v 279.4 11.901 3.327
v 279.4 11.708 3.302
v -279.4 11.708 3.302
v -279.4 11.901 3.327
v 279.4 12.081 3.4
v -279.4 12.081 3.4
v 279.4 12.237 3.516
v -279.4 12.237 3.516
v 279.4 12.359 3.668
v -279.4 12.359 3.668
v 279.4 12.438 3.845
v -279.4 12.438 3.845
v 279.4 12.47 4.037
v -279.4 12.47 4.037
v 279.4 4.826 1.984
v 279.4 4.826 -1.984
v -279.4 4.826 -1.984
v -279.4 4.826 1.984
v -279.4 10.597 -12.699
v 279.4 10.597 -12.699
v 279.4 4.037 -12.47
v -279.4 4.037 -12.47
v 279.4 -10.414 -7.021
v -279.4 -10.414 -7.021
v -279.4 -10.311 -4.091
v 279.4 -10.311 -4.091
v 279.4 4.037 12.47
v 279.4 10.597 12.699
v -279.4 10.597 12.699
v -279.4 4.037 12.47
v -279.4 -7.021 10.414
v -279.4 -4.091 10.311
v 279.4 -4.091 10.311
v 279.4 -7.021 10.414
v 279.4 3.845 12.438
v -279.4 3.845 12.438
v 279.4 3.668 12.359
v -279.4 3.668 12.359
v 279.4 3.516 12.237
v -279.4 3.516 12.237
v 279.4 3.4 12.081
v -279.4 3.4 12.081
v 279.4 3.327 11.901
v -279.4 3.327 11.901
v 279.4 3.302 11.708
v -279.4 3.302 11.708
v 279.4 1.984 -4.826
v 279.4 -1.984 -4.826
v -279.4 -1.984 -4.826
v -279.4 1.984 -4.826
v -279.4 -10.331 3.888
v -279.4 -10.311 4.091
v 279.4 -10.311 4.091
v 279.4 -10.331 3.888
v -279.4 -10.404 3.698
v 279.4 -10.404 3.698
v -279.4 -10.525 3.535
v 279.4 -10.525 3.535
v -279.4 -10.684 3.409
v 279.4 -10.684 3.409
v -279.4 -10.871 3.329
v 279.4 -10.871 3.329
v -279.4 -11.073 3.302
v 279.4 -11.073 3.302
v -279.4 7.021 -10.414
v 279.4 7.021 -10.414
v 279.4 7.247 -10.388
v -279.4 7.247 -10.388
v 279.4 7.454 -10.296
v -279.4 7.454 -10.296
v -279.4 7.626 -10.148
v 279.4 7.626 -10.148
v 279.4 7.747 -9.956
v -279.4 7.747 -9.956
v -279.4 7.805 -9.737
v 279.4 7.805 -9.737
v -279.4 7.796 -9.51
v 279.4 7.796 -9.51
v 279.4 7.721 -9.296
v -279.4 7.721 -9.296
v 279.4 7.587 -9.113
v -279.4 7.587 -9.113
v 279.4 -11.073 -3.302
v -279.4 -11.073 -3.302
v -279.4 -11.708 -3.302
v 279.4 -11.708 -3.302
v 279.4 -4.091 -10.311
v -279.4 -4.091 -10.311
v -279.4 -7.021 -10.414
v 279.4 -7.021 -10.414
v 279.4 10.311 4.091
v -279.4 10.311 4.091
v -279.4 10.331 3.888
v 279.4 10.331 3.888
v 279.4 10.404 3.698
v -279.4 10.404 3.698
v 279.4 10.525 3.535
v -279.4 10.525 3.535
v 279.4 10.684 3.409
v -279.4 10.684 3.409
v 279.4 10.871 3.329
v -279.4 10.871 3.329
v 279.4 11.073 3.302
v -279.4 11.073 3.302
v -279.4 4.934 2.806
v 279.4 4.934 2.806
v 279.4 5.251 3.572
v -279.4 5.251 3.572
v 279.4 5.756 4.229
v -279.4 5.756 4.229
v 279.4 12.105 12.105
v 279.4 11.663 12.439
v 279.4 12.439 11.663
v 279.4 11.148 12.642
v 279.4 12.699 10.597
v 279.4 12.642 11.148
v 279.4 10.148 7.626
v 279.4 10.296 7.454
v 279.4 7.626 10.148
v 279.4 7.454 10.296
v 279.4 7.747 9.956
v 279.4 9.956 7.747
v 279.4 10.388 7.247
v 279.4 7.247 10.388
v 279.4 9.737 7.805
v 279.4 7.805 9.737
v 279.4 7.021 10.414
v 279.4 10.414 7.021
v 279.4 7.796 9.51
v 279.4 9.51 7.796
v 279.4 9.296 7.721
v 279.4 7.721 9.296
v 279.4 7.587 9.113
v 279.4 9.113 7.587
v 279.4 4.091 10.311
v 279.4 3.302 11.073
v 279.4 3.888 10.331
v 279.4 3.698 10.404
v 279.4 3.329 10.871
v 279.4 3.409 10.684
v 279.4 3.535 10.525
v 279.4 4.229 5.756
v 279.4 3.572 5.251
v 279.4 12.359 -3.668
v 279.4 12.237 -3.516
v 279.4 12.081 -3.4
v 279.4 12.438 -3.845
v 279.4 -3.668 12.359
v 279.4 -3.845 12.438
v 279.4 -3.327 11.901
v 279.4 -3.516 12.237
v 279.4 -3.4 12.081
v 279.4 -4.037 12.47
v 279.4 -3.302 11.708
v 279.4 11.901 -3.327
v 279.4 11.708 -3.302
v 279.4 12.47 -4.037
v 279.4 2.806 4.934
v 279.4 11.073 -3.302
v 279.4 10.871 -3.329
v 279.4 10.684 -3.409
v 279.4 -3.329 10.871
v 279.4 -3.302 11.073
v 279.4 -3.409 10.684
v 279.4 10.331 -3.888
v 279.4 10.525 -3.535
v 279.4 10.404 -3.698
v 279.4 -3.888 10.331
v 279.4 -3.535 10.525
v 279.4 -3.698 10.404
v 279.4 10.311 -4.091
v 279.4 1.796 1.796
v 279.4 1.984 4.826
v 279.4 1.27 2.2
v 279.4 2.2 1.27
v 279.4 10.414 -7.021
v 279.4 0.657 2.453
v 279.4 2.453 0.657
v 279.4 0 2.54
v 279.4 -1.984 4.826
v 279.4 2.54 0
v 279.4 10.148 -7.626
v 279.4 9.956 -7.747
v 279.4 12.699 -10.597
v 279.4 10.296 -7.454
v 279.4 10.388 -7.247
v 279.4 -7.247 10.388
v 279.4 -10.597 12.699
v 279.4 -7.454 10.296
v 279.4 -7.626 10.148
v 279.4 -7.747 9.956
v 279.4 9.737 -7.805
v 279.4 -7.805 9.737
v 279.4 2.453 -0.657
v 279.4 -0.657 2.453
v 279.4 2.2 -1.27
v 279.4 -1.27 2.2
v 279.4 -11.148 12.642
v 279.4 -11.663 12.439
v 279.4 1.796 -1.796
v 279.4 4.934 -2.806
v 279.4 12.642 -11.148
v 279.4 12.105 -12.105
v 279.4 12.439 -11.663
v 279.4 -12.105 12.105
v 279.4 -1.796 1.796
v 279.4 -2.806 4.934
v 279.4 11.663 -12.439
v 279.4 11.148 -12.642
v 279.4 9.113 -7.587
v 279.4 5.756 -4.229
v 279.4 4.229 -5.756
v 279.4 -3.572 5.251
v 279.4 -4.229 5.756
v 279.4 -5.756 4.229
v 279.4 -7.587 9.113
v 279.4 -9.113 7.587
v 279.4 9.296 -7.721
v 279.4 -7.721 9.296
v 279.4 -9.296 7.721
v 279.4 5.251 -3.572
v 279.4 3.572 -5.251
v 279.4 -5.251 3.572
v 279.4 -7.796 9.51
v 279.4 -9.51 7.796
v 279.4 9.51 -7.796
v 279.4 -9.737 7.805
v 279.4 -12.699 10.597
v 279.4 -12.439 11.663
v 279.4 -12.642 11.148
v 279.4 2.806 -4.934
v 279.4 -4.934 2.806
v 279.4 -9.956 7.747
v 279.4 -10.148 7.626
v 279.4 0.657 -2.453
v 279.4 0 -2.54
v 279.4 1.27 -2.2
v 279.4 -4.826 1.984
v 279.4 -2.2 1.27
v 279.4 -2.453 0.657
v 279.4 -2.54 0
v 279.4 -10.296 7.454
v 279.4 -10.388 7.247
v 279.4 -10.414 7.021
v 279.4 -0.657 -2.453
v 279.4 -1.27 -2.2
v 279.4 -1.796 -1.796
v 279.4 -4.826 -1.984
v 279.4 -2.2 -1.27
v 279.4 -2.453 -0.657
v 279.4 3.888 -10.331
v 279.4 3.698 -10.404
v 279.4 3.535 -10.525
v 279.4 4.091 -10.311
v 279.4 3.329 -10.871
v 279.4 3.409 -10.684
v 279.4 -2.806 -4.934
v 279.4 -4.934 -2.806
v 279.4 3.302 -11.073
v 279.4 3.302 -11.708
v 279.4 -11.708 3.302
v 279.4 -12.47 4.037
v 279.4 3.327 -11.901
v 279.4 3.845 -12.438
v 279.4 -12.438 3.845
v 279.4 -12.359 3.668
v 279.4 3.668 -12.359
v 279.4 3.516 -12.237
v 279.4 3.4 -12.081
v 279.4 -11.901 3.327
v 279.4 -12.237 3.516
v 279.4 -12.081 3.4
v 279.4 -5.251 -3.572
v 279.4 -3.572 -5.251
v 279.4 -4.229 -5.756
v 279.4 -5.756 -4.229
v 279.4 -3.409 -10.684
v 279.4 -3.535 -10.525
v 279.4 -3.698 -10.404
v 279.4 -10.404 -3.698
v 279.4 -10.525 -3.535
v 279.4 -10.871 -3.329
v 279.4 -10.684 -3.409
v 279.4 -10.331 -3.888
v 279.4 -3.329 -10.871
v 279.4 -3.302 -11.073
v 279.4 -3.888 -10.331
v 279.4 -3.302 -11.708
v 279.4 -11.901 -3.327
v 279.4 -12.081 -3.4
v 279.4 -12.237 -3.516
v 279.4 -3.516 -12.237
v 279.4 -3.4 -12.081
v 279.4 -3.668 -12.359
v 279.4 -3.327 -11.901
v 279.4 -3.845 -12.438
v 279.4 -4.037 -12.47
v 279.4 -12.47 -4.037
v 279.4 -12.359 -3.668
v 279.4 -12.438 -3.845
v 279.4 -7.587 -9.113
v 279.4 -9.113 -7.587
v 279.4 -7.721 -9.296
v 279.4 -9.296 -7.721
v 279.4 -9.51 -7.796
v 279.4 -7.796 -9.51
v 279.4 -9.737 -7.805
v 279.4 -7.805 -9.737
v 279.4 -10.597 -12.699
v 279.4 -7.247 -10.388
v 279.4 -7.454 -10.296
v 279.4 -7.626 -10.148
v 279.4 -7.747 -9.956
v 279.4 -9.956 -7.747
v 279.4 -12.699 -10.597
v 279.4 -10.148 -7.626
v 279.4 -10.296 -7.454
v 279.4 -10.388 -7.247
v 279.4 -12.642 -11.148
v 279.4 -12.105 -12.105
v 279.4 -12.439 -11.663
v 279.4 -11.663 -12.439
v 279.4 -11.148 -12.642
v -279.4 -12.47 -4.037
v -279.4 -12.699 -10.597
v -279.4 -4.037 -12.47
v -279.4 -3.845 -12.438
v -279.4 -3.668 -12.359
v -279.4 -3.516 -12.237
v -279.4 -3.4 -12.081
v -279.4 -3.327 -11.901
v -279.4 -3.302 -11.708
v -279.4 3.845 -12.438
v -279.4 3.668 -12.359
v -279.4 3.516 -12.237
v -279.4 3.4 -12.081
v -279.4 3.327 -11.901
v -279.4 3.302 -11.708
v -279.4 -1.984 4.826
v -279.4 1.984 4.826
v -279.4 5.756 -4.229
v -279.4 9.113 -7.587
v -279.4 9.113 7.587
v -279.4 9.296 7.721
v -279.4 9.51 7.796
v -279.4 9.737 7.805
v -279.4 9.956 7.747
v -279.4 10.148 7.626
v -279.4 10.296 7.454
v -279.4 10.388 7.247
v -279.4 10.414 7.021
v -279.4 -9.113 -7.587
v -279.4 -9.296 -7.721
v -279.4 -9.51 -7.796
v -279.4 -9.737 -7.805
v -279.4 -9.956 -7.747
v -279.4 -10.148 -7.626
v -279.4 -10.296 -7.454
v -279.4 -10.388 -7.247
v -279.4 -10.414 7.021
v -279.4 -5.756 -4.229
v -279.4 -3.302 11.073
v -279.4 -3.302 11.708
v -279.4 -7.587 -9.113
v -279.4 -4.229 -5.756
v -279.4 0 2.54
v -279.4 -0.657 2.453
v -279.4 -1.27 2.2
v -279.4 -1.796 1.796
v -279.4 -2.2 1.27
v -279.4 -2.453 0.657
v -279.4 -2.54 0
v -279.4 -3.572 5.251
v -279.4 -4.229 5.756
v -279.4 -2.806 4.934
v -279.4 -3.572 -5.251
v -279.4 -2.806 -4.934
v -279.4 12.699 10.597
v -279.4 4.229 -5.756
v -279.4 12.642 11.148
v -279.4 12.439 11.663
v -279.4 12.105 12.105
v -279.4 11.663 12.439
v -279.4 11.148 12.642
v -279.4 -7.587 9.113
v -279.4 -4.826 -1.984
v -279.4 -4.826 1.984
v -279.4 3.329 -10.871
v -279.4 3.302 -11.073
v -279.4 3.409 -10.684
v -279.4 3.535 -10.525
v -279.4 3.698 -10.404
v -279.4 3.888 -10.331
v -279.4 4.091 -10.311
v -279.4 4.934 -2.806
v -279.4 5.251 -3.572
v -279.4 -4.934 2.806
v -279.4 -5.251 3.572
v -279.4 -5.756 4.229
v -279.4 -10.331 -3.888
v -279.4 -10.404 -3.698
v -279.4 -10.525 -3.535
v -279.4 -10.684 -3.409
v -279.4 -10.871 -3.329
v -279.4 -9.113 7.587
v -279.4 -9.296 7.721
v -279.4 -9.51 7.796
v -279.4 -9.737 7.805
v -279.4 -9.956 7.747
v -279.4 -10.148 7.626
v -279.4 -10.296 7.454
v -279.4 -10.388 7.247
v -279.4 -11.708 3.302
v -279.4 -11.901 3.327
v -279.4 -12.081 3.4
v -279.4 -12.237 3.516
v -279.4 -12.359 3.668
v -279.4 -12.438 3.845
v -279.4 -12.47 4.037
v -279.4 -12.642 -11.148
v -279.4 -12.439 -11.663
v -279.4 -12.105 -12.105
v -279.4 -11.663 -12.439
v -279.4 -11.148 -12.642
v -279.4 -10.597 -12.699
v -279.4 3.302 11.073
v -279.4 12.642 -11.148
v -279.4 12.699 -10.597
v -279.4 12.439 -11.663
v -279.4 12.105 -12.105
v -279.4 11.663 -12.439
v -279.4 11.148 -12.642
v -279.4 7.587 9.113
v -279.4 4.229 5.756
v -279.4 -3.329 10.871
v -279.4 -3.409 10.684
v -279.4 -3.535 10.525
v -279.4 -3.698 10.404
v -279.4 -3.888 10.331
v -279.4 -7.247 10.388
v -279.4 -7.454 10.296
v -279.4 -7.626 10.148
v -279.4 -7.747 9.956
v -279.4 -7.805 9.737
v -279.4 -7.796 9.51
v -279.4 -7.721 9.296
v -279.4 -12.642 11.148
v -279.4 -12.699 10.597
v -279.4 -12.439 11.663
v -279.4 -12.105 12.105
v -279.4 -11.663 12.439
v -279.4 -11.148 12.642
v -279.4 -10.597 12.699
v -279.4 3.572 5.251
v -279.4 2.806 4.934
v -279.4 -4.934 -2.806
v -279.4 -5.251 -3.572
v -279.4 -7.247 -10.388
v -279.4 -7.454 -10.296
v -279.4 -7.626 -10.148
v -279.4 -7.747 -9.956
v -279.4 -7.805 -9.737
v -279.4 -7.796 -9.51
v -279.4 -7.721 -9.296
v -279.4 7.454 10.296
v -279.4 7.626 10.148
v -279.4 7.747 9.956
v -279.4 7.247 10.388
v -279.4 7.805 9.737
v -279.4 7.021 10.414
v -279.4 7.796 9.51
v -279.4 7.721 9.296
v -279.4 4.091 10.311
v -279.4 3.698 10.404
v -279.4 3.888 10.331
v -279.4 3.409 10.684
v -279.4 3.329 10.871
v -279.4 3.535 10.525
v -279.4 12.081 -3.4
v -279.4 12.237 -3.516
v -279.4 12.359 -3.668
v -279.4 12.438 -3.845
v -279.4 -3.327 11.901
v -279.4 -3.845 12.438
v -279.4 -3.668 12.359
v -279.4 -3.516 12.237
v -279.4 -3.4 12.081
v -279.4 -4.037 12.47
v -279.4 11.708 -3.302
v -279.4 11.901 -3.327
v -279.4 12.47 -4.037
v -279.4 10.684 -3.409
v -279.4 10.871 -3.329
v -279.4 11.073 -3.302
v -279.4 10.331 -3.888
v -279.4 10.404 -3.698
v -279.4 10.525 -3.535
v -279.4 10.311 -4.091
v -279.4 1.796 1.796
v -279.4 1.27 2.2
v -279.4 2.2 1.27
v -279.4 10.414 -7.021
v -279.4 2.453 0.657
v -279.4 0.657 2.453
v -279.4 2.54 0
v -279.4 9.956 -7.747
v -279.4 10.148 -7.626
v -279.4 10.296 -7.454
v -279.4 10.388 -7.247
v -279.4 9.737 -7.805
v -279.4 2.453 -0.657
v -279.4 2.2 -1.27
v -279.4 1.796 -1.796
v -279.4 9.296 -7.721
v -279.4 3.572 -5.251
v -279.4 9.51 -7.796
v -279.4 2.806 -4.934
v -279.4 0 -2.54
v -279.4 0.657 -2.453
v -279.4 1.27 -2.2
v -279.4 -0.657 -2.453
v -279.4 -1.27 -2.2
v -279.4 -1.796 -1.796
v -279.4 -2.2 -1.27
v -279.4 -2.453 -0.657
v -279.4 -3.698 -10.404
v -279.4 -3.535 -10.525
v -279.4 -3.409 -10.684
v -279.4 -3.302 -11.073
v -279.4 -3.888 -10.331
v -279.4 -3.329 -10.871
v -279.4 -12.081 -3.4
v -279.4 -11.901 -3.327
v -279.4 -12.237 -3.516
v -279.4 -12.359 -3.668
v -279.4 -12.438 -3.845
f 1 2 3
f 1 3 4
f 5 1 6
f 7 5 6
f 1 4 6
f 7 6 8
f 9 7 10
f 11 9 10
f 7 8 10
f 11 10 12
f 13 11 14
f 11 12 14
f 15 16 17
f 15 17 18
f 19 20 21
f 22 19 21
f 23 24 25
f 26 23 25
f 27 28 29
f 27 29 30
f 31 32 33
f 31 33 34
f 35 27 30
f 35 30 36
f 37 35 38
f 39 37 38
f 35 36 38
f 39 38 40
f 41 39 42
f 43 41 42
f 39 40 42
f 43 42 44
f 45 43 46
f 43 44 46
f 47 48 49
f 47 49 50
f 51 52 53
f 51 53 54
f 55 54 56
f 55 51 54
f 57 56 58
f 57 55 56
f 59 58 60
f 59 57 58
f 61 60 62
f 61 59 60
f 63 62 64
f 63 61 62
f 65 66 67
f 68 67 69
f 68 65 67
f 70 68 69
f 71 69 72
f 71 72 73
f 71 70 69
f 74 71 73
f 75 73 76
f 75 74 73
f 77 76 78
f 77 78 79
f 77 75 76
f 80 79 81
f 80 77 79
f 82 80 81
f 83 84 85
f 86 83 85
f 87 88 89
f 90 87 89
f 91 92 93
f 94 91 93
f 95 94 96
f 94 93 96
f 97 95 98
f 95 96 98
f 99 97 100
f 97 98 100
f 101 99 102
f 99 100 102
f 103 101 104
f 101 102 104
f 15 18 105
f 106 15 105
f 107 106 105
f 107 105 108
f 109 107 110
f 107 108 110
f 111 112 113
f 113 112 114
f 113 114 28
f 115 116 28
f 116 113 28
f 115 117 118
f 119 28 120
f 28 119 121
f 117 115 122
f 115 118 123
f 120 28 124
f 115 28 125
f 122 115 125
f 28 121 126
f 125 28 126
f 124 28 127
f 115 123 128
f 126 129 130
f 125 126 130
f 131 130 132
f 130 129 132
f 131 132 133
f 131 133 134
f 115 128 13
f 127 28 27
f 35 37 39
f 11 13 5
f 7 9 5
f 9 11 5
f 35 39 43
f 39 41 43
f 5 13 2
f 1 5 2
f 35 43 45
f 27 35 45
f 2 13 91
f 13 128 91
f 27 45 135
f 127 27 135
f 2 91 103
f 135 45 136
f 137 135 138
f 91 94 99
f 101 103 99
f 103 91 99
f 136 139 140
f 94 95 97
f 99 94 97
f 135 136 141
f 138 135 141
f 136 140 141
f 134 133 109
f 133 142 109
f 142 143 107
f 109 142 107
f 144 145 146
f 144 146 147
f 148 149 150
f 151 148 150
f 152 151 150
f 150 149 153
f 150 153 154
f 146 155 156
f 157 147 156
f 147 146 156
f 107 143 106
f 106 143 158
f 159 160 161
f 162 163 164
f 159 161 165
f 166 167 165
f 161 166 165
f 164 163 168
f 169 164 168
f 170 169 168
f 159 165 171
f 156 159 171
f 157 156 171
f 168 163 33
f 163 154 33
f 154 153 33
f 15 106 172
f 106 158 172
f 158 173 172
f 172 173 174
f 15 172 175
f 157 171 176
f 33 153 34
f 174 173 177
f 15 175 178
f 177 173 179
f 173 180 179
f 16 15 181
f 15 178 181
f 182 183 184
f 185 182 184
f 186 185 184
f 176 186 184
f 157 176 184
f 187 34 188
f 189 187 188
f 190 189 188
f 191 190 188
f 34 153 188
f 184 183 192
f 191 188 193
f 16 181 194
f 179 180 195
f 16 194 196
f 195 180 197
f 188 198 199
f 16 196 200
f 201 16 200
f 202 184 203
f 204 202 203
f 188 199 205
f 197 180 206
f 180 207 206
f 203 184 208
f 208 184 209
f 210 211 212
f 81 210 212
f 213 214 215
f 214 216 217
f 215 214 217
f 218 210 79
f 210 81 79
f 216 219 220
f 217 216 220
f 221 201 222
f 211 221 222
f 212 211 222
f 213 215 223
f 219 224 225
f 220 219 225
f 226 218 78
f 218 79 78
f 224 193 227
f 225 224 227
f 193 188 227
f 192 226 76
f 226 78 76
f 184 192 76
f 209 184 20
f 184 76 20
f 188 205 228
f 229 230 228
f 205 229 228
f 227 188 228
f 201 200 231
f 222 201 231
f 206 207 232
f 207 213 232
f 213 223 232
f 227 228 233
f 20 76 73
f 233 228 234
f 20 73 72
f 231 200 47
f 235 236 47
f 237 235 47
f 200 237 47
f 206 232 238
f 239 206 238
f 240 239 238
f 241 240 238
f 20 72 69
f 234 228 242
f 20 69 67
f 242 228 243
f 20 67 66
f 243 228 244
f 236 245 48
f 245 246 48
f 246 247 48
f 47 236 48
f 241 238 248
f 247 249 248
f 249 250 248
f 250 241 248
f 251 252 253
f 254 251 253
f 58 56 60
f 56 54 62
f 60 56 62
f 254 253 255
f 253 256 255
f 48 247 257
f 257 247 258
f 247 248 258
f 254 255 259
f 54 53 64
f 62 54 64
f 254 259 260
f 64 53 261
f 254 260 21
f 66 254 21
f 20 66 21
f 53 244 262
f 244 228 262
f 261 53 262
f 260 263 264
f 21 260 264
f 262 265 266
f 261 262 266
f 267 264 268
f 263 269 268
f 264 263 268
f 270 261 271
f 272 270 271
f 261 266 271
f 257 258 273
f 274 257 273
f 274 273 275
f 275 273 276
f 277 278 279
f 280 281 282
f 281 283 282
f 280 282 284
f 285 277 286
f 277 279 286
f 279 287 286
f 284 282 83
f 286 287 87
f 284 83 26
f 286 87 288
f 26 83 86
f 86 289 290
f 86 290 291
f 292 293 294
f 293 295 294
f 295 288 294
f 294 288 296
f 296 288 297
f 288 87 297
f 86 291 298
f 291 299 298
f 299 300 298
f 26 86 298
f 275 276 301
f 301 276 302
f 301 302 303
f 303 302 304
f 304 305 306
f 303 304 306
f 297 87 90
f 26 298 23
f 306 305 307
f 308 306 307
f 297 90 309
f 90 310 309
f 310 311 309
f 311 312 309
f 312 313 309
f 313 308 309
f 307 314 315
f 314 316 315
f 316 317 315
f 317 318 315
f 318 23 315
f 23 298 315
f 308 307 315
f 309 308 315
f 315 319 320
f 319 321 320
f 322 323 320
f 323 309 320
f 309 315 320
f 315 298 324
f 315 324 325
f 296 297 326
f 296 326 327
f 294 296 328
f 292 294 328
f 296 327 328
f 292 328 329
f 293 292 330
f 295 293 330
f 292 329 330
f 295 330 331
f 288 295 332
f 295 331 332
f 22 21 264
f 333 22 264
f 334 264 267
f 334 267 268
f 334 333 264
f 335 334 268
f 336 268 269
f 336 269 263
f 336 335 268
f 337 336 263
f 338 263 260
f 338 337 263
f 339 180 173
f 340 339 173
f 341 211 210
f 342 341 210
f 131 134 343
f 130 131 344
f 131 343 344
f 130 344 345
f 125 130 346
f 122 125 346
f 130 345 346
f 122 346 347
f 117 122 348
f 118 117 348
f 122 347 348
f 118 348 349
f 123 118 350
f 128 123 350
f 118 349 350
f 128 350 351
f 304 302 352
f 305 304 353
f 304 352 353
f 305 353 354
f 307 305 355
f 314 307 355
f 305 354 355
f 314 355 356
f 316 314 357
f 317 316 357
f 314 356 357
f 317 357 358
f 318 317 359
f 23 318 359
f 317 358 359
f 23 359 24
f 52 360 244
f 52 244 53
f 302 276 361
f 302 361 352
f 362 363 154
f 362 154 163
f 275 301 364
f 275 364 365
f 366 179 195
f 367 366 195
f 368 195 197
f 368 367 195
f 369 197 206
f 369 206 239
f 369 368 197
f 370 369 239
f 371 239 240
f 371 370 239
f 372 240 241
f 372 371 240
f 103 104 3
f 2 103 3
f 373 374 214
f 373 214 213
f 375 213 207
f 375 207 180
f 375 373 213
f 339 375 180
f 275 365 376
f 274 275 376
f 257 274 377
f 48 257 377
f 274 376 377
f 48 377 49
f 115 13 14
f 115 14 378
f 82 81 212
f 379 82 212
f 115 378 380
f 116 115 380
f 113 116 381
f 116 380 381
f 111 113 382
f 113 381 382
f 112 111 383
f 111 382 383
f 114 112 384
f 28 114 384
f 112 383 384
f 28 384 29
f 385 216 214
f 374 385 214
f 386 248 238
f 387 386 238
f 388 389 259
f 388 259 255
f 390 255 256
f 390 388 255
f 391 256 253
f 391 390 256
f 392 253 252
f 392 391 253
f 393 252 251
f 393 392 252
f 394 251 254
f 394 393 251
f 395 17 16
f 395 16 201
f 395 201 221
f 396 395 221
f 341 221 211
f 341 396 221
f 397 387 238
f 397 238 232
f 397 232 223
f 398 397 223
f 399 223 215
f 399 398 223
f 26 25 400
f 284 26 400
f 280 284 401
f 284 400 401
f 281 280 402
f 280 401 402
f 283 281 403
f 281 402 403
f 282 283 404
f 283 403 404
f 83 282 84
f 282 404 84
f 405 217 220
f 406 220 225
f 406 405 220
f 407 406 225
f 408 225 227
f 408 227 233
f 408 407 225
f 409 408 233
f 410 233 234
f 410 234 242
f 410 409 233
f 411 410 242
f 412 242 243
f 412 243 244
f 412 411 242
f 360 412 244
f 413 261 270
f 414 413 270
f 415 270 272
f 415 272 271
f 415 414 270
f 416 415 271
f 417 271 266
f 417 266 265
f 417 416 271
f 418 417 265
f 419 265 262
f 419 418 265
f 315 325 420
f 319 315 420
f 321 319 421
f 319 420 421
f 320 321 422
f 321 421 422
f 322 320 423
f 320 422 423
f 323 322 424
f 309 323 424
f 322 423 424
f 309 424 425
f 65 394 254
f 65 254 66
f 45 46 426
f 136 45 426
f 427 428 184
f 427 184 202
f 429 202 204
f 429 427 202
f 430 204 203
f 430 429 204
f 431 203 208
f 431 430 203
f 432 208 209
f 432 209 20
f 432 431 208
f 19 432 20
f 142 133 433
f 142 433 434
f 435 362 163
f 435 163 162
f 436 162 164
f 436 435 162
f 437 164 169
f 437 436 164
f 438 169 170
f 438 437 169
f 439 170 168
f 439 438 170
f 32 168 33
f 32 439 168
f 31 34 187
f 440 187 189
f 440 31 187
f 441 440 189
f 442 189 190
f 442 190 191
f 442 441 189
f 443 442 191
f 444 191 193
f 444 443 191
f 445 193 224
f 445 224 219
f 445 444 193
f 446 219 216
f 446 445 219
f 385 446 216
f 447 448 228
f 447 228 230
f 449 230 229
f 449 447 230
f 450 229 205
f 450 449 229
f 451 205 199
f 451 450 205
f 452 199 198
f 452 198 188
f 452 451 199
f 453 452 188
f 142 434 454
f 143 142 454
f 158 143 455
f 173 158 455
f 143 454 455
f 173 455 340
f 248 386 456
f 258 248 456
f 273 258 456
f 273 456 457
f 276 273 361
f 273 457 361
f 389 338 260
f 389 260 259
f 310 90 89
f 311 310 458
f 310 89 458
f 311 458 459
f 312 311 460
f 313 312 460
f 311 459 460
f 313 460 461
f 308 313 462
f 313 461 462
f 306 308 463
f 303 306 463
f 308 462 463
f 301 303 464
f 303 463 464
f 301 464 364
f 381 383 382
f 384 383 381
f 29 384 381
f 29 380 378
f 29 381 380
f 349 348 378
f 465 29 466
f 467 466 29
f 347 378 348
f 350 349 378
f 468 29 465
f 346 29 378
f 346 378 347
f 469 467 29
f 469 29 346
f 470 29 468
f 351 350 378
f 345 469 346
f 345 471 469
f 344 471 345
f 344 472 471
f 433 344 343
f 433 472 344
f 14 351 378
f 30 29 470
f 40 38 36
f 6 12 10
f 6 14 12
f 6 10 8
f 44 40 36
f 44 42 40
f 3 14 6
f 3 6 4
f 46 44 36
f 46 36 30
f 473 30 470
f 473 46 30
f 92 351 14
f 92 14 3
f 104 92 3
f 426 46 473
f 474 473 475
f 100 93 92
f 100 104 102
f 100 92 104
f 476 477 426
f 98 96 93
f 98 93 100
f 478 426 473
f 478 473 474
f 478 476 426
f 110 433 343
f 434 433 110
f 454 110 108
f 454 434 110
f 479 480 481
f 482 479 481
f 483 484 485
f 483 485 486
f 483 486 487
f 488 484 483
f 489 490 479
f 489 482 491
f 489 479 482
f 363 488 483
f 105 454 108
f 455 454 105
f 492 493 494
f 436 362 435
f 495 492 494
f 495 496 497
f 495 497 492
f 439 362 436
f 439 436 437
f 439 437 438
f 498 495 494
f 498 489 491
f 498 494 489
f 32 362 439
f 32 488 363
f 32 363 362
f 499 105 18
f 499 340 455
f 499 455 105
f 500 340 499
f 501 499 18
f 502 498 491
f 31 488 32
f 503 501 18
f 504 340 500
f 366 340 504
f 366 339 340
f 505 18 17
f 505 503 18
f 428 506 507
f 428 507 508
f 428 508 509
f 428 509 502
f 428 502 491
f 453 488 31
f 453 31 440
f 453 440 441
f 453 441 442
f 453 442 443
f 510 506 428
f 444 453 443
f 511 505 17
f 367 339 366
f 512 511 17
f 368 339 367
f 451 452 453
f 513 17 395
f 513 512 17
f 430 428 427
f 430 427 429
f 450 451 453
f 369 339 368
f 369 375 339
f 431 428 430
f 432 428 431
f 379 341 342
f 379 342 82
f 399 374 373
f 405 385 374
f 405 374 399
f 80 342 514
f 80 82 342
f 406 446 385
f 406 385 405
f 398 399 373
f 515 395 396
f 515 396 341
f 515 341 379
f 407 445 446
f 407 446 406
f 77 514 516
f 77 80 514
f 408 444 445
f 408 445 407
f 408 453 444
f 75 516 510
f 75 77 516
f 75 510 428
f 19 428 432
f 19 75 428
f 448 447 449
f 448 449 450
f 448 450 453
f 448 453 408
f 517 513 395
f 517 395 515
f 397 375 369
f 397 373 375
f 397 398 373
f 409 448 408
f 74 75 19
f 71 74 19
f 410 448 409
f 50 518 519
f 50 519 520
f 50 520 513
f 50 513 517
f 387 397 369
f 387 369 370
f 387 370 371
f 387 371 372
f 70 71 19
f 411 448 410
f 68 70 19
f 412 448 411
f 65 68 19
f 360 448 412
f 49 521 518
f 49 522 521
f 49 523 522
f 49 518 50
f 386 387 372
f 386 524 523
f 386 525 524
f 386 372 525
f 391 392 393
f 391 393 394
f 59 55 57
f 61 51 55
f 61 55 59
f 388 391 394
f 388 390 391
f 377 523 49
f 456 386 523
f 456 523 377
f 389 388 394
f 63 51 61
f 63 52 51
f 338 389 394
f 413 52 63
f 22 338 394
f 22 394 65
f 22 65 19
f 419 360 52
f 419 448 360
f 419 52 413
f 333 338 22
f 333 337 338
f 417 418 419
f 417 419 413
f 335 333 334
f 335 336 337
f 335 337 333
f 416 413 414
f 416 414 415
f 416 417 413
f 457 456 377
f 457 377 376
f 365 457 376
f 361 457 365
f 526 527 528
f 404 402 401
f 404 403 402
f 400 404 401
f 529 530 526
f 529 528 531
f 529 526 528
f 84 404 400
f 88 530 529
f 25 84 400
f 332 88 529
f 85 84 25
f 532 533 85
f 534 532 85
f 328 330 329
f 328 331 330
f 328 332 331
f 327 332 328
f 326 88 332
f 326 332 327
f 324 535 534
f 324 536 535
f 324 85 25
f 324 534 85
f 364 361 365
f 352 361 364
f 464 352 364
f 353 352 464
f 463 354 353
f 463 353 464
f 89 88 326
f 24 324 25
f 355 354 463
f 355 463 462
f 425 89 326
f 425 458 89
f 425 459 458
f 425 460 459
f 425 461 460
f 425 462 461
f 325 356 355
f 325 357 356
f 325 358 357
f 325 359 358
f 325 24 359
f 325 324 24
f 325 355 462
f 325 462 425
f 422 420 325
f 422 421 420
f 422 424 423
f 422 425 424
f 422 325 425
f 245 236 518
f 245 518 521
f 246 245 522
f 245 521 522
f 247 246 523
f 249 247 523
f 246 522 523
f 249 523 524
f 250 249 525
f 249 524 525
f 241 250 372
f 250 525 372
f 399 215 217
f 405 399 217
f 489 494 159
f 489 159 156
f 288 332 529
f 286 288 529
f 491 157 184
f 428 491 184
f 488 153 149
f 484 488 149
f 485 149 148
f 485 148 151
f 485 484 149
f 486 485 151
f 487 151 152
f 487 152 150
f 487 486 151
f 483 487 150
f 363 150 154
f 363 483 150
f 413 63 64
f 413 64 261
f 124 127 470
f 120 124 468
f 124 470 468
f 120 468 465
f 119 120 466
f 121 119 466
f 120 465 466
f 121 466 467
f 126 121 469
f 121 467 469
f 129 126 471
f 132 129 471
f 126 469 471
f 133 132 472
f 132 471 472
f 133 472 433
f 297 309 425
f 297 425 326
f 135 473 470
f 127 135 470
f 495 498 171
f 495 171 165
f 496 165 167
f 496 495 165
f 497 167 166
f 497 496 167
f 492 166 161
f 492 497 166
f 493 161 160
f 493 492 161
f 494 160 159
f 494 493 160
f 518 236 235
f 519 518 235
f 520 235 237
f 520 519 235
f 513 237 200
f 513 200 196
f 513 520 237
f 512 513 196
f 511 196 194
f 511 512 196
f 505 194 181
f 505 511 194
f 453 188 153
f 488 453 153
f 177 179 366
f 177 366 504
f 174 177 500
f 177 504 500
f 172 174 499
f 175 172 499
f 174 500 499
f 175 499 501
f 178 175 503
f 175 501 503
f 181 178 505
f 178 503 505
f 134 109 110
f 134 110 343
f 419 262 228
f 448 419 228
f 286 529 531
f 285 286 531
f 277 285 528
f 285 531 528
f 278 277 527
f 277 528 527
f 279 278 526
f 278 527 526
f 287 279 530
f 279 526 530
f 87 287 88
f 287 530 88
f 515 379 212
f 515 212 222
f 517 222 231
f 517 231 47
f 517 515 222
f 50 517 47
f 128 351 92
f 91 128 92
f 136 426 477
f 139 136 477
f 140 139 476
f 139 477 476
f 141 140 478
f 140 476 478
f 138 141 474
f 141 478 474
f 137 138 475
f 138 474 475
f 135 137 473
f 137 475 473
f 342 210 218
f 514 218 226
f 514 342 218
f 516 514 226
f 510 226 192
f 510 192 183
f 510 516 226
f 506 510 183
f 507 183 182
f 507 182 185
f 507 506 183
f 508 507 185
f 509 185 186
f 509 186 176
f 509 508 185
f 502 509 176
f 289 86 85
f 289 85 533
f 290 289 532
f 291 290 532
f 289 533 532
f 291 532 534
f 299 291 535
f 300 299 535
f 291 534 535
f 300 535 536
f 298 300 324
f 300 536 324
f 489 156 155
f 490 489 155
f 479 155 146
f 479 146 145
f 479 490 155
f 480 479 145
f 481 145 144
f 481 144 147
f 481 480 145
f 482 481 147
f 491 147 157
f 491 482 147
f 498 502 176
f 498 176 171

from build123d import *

# Parameters (mm, degrees)
BOSS_EXTRUDE1_DEPTH      = 279.4
BOSS_EXTRUDE1_DEPTH_BACK = 279.4


with BuildPart() as part:
    # Sketch3 → Boss-Extrude1 (new, two sides: drawn at the far end of the back side and taken through both)
    with BuildSketch(Plane(origin=(0, 0, 0), x_dir=(0, 0, -1), z_dir=(1, 0, 0)).offset(-BOSS_EXTRUDE1_DEPTH_BACK)):
        with BuildLine():
            Line((0, 4.826), (1.984228399, 4.826))
            ThreePointArc((1.984228399, 4.826), (3.199248297, 5.067682484), (4.229292429, 5.75593597))
            Line((4.229292429, 5.75593597), (7.586577723, 9.113221264))
            ThreePointArc((7.586577723, 9.113221264), (7.746562132, 9.955883421), (7.021168939, 10.413572441))
            Line((7.021168939, 10.413572441), (4.090593416, 10.311234489))
            ThreePointArc((4.090593416, 10.311234489), (3.534670322, 10.524633371), (3.302, 11.072770299))
            Line((3.302, 11.072770299), (3.302, 11.70815736))
            ThreePointArc((3.302, 11.70815736), (3.515863072, 12.237487038), (4.037406584, 12.46969317))
            Line((4.037406584, 12.46969317), (10.597084223, 12.698762161))
            ThreePointArc((10.597084223, 12.698762161), (12.104840979, 12.104840979), (12.698762161, 10.597084223))
            Line((12.698762161, 10.597084223), (12.46969317, 4.037406584))
            ThreePointArc((12.46969317, 4.037406584), (12.237487038, 3.515863072), (11.70815736, 3.302))
            Line((11.70815736, 3.302), (11.072770299, 3.302))
            ThreePointArc((11.072770299, 3.302), (10.524633371, 3.534670322), (10.311234489, 4.090593416))
            Line((10.311234489, 4.090593416), (10.413572441, 7.021168939))
            ThreePointArc((10.413572441, 7.021168939), (9.955883421, 7.746562132), (9.113221264, 7.586577723))
            Line((9.113221264, 7.586577723), (5.75593597, 4.229292429))
            ThreePointArc((5.75593597, 4.229292429), (5.067682484, 3.199248297), (4.826, 1.984228399))
            Line((4.826, 1.984228399), (4.826, 0))
            Line((4.826, 0), (2.54, 0))
            ThreePointArc((2.54, 0), (1.796051224, 1.796051224), (0, 2.54))
            Line((0, 2.54), (0, 4.826))
        make_face()
    extrude(amount=BOSS_EXTRUDE1_DEPTH + BOSS_EXTRUDE1_DEPTH_BACK)

    # Mirror1: part across plane


with BuildPart() as part_1:
    add(part.part)
    add(part.part.mirror(Plane.ZX))

    # Mirror2: part across plane


with BuildPart() as part_2:
    add(part_1.part)
    add(part_1.part.mirror(Plane.XY))


solid = part_2.part
